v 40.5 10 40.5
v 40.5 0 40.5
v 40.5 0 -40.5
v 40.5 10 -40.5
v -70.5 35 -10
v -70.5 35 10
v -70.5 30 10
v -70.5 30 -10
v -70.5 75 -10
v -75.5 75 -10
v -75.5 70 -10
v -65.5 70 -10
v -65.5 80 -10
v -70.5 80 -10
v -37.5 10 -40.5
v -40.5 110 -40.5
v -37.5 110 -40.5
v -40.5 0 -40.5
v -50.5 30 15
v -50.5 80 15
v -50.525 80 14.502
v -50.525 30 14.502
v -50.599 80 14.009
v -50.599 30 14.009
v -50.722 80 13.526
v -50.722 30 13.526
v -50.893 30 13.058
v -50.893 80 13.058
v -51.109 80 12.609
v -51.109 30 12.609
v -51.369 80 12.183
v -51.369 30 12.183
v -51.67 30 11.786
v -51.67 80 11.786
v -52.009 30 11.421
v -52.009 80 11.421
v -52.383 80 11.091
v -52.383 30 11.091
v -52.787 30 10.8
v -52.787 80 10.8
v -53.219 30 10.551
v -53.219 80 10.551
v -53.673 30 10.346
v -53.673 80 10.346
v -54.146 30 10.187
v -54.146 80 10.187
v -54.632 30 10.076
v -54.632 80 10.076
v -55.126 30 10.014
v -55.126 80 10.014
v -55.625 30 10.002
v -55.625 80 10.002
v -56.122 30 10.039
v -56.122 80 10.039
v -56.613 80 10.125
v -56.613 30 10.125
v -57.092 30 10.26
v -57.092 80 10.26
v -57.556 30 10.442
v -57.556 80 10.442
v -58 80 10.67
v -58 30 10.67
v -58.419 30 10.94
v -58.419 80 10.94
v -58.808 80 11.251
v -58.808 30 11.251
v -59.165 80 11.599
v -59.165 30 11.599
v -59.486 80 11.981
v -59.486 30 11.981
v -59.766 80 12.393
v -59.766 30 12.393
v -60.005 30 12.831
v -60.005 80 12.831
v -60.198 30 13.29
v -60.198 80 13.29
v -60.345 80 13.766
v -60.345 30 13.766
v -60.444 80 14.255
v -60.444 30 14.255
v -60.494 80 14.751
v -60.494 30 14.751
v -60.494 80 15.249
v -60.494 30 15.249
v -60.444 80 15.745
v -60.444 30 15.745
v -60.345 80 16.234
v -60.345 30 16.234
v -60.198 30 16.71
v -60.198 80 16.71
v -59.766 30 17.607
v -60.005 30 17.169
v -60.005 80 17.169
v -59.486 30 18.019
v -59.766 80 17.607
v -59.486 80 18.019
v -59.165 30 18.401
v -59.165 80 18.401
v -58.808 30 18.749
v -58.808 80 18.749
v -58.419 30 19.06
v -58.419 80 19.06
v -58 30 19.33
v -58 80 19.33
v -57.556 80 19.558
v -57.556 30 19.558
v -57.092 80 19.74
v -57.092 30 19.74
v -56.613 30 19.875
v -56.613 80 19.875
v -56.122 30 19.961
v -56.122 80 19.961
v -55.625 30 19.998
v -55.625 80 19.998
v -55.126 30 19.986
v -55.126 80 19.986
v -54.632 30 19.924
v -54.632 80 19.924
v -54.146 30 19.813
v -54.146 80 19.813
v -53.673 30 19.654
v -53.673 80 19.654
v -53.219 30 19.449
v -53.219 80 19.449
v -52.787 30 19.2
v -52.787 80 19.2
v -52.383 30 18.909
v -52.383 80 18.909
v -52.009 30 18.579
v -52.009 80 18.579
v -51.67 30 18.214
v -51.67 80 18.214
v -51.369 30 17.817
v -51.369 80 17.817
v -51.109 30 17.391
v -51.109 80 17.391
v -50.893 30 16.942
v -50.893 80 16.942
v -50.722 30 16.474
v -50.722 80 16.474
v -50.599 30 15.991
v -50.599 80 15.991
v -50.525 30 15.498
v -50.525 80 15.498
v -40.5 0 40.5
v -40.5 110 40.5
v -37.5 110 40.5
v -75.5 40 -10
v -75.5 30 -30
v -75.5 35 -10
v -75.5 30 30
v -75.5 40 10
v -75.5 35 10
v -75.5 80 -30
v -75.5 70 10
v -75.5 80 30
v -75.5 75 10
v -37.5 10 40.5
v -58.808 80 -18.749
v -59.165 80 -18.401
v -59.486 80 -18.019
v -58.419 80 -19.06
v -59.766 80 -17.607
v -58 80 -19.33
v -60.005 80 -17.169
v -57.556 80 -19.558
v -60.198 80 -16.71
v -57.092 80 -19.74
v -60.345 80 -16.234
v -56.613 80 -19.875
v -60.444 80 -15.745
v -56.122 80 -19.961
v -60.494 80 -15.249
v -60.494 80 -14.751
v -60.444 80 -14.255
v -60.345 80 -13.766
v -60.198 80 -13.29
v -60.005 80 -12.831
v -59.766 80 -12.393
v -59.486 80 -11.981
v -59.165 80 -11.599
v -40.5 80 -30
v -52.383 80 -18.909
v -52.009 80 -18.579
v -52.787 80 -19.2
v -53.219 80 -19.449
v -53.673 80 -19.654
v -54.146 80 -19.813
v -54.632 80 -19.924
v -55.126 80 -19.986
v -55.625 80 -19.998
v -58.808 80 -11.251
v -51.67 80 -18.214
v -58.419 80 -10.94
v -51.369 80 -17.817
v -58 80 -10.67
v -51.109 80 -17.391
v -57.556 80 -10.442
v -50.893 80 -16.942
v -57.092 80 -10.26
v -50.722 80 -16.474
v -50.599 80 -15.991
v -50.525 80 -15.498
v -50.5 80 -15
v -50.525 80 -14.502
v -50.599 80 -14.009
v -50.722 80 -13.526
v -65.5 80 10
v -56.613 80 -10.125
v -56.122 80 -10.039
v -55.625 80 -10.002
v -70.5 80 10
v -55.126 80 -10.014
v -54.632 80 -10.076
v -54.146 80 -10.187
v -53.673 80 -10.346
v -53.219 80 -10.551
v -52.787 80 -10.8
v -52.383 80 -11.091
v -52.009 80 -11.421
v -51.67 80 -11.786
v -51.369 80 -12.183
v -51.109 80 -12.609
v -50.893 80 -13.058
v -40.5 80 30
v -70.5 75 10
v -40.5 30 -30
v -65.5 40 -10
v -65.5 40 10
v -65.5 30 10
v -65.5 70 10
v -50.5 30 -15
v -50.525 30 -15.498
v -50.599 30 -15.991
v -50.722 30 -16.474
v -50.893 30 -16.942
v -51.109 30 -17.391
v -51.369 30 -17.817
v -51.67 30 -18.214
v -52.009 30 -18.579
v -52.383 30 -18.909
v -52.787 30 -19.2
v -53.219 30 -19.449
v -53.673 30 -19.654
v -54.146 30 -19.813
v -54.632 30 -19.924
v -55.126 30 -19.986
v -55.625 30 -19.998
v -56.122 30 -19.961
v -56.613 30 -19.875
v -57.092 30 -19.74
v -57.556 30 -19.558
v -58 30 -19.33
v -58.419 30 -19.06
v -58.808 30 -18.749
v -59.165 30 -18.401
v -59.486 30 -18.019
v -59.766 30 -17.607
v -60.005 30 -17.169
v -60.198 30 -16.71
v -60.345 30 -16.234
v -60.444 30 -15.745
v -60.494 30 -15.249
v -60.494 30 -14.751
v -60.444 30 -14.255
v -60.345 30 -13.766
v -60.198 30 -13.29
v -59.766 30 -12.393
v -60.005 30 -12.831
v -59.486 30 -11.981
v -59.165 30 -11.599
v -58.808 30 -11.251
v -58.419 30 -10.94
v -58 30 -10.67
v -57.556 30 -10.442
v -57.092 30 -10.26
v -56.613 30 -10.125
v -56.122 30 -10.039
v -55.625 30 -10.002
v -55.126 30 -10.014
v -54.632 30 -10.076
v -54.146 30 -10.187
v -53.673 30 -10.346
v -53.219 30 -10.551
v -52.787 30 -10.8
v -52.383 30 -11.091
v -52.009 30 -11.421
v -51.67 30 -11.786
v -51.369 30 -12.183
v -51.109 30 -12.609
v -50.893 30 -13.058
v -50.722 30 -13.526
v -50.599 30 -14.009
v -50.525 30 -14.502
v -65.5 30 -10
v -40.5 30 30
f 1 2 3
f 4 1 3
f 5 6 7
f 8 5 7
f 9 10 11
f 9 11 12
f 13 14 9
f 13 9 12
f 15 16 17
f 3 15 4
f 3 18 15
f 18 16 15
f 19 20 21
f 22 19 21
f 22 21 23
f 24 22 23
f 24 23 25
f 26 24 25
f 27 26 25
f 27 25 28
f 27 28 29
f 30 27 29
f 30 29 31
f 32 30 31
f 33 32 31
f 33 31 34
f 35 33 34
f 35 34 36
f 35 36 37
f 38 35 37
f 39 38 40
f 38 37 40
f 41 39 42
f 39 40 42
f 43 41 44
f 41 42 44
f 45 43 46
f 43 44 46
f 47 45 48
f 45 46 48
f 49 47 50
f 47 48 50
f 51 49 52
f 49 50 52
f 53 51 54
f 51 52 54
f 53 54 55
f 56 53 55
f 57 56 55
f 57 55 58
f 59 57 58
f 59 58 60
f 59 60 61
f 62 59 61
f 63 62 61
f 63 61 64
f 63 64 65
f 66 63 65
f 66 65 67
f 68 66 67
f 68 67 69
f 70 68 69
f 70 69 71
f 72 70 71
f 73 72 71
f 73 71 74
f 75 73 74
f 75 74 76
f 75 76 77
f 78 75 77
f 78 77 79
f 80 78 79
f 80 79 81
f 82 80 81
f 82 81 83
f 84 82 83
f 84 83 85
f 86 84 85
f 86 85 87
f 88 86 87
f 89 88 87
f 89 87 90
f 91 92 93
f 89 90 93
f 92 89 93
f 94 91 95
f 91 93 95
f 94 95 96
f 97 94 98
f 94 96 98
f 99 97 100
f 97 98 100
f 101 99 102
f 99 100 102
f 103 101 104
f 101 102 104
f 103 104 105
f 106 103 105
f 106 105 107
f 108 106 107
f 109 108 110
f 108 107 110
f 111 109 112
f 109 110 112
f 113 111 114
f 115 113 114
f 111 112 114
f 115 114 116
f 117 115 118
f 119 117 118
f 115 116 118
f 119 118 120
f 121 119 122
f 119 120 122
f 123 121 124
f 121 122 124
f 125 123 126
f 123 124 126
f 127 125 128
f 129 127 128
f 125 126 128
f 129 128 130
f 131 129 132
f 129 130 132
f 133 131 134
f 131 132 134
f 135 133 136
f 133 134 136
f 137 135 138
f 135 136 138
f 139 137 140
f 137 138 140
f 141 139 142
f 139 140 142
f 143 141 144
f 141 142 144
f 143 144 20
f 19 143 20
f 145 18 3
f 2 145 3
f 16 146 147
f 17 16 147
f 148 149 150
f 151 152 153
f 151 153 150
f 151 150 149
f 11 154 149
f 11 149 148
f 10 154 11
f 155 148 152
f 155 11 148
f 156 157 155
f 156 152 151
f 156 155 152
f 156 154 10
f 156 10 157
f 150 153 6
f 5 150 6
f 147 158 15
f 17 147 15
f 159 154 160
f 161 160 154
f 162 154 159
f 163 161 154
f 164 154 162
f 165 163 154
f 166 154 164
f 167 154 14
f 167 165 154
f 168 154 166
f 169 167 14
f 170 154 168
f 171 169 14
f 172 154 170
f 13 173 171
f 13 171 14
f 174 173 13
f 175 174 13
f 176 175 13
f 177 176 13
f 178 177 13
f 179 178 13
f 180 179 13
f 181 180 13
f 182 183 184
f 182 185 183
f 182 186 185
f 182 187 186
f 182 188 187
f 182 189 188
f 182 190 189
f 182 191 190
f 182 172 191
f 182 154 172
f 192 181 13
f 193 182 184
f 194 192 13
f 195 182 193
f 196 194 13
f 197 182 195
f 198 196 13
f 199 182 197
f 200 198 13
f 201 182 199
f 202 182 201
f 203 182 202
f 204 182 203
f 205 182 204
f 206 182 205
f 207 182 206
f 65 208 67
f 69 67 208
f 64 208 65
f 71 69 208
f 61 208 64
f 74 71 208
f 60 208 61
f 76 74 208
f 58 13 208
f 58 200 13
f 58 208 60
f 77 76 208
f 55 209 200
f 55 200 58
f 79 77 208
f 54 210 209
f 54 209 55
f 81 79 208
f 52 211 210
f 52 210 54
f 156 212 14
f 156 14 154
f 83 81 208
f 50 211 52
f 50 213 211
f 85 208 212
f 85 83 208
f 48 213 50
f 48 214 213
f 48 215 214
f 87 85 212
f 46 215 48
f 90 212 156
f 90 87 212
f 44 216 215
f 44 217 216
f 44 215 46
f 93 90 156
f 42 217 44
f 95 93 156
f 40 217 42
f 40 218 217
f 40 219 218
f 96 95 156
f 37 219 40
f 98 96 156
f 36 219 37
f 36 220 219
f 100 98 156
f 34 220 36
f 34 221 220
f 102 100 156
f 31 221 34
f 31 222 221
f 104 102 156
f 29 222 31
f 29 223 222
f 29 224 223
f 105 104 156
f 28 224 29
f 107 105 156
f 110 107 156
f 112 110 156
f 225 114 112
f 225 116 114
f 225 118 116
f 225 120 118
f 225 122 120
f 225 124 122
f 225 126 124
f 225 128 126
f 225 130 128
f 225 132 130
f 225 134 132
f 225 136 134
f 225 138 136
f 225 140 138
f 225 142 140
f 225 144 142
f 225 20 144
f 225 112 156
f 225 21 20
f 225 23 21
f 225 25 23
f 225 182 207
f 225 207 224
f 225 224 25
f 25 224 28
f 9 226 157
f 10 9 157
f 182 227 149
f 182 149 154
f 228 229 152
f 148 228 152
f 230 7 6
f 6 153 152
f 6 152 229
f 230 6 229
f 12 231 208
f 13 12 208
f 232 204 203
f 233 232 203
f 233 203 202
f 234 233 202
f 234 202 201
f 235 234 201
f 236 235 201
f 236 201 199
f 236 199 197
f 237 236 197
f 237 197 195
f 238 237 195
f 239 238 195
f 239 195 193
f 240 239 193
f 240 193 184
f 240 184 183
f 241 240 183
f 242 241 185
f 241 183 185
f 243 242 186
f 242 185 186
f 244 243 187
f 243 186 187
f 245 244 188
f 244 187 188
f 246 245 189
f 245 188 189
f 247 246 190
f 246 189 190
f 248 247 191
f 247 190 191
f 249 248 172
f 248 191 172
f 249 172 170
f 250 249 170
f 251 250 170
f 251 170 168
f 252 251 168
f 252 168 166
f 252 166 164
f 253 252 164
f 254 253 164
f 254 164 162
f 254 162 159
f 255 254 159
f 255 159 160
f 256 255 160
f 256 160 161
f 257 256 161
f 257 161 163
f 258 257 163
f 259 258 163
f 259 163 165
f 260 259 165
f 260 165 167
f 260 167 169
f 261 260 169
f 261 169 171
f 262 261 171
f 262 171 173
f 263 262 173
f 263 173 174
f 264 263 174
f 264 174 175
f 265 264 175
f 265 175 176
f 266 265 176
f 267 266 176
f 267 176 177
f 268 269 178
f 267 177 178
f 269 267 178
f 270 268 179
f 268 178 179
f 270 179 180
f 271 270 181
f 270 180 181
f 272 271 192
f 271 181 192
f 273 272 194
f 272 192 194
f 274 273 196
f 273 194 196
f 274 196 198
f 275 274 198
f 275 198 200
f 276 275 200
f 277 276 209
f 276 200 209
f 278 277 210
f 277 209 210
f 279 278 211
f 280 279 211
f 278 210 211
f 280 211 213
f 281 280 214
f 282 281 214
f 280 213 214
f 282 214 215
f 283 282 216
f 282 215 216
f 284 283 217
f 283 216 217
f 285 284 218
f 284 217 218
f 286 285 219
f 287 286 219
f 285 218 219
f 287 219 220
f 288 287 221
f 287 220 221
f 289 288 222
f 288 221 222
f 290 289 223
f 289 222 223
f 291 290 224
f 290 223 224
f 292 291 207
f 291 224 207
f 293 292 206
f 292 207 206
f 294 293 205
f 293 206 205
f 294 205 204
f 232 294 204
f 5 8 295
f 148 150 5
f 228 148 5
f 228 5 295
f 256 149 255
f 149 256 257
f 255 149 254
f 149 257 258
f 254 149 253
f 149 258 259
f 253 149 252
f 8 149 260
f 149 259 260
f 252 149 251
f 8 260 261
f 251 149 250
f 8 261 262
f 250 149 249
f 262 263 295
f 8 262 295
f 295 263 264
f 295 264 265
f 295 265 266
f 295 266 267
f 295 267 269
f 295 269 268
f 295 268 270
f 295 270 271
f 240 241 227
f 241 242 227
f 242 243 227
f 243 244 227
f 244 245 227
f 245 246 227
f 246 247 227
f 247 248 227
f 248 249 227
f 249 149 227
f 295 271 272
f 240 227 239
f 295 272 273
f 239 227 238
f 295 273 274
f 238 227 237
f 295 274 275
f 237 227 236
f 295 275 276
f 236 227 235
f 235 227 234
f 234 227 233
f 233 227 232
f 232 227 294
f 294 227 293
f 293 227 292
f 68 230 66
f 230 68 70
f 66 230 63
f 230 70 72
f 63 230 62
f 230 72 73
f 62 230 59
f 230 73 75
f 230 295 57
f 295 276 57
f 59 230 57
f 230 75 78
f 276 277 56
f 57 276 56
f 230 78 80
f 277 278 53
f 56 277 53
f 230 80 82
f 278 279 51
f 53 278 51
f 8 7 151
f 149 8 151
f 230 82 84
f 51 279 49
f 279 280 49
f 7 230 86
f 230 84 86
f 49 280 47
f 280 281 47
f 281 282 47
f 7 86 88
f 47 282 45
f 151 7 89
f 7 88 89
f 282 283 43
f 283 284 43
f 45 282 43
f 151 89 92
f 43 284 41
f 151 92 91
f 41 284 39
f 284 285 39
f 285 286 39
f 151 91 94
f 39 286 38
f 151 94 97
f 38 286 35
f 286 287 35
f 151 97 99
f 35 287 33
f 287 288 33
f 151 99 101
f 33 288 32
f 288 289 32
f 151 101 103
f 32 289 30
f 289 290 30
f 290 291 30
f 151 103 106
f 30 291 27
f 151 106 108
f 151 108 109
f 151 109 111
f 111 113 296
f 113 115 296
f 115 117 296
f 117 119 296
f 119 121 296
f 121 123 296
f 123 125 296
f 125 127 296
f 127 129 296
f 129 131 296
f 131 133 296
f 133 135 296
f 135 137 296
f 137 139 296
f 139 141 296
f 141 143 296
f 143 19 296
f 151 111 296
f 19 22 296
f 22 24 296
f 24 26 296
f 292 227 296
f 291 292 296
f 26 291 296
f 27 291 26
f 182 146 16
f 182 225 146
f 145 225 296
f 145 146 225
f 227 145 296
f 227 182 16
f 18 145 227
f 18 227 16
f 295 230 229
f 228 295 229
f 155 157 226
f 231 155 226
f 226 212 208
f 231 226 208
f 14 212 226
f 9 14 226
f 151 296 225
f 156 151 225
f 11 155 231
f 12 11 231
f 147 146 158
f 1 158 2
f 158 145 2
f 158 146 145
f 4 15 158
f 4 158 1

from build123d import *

# Parameters (mm, degrees)
SKETCH1_W           = 81
SKETCH1_H           = 81
BOSS_EXTRUDE1_DEPTH = 10
BOSS_EXTRUDE2_START = 10
SKETCH2_W           = 3
SKETCH2_H           = 81
BOSS_EXTRUDE2_DEPTH = 100
SKETCH3_W           = 60
SKETCH3_H           = 50
BOSS_EXTRUDE3_DEPTH = 35
CUT_EXTRUDE1_REACH  = 82
SKETCH4_R           = 5
CUT_EXTRUDE4_START  = -20
CUT_EXTRUDE4_DEPTH  = 20


with BuildPart() as part:
    # Sketch1 → Boss-Extrude1 (new body)
    with BuildSketch(Plane(origin=(0, 0, 0), x_dir=(1, 0, 0), z_dir=(0, 1, 0))):
        Rectangle(SKETCH1_W, SKETCH1_H)
    extrude(amount=BOSS_EXTRUDE1_DEPTH)

    # Sketch2 → Boss-Extrude2 (add)
    with BuildSketch(Plane(origin=(0, 0, 0), x_dir=(1, 0, 0), z_dir=(0, 1, 0)).offset(BOSS_EXTRUDE2_START)):
        with Locations((-39, 0)):
            Rectangle(SKETCH2_W, SKETCH2_H)
    extrude(amount=BOSS_EXTRUDE2_DEPTH)

    # Sketch3 → Boss-Extrude3 (add)
    with BuildSketch(Plane.ZY.offset(40.5)):
        with Locations((0, 55)):
            Rectangle(SKETCH3_W, SKETCH3_H)
    extrude(amount=BOSS_EXTRUDE3_DEPTH)

    # Sketch4 → Cut-Extrude1 (cut, up to next)
    with BuildSketch(Plane(origin=(0, 80, 0), x_dir=(1, 0, 0), z_dir=(0, 1, 0)), mode=Mode.PRIVATE) as cut_extrude1_sk1:
        with Locations((-55.5, 15)):
            Circle(SKETCH4_R)
    cut_extrude1_tool1 = extrude(cut_extrude1_sk1.sketch, amount=-CUT_EXTRUDE1_REACH, mode=Mode.PRIVATE) & part.part
    add(cut_extrude1_tool1.solids().sort_by_distance((-55.5, 80, -15))[0], mode=Mode.SUBTRACT)
    # Sketch4 → Cut-Extrude1 (cut, up to next)
    with BuildSketch(Plane(origin=(0, 80, 0), x_dir=(1, 0, 0), z_dir=(0, 1, 0)), mode=Mode.PRIVATE) as cut_extrude1_sk2:
        with Locations((-55.5, -15)):
            Circle(SKETCH4_R)
    cut_extrude1_tool2 = extrude(cut_extrude1_sk2.sketch, amount=-CUT_EXTRUDE1_REACH, mode=Mode.PRIVATE) & part.part
    add(cut_extrude1_tool2.solids().sort_by_distance((-55.5, 80, 15))[0], mode=Mode.SUBTRACT)

    # Sketch5 → Cut-Extrude4 (cut)
    with BuildSketch(Plane.XY.offset(30).offset(CUT_EXTRUDE4_START)):
        Polygon((-75.5, 75), (-75.5, 70), (-65.5, 70), (-65.5, 80), (-70.5, 80), (-70.5, 75), align=None)
        Polygon((-65.5, 30), (-65.5, 40), (-75.5, 40), (-75.5, 35), (-70.5, 35), (-70.5, 30), align=None)
    extrude(amount=-CUT_EXTRUDE4_DEPTH, mode=Mode.SUBTRACT)


solid = part.part
